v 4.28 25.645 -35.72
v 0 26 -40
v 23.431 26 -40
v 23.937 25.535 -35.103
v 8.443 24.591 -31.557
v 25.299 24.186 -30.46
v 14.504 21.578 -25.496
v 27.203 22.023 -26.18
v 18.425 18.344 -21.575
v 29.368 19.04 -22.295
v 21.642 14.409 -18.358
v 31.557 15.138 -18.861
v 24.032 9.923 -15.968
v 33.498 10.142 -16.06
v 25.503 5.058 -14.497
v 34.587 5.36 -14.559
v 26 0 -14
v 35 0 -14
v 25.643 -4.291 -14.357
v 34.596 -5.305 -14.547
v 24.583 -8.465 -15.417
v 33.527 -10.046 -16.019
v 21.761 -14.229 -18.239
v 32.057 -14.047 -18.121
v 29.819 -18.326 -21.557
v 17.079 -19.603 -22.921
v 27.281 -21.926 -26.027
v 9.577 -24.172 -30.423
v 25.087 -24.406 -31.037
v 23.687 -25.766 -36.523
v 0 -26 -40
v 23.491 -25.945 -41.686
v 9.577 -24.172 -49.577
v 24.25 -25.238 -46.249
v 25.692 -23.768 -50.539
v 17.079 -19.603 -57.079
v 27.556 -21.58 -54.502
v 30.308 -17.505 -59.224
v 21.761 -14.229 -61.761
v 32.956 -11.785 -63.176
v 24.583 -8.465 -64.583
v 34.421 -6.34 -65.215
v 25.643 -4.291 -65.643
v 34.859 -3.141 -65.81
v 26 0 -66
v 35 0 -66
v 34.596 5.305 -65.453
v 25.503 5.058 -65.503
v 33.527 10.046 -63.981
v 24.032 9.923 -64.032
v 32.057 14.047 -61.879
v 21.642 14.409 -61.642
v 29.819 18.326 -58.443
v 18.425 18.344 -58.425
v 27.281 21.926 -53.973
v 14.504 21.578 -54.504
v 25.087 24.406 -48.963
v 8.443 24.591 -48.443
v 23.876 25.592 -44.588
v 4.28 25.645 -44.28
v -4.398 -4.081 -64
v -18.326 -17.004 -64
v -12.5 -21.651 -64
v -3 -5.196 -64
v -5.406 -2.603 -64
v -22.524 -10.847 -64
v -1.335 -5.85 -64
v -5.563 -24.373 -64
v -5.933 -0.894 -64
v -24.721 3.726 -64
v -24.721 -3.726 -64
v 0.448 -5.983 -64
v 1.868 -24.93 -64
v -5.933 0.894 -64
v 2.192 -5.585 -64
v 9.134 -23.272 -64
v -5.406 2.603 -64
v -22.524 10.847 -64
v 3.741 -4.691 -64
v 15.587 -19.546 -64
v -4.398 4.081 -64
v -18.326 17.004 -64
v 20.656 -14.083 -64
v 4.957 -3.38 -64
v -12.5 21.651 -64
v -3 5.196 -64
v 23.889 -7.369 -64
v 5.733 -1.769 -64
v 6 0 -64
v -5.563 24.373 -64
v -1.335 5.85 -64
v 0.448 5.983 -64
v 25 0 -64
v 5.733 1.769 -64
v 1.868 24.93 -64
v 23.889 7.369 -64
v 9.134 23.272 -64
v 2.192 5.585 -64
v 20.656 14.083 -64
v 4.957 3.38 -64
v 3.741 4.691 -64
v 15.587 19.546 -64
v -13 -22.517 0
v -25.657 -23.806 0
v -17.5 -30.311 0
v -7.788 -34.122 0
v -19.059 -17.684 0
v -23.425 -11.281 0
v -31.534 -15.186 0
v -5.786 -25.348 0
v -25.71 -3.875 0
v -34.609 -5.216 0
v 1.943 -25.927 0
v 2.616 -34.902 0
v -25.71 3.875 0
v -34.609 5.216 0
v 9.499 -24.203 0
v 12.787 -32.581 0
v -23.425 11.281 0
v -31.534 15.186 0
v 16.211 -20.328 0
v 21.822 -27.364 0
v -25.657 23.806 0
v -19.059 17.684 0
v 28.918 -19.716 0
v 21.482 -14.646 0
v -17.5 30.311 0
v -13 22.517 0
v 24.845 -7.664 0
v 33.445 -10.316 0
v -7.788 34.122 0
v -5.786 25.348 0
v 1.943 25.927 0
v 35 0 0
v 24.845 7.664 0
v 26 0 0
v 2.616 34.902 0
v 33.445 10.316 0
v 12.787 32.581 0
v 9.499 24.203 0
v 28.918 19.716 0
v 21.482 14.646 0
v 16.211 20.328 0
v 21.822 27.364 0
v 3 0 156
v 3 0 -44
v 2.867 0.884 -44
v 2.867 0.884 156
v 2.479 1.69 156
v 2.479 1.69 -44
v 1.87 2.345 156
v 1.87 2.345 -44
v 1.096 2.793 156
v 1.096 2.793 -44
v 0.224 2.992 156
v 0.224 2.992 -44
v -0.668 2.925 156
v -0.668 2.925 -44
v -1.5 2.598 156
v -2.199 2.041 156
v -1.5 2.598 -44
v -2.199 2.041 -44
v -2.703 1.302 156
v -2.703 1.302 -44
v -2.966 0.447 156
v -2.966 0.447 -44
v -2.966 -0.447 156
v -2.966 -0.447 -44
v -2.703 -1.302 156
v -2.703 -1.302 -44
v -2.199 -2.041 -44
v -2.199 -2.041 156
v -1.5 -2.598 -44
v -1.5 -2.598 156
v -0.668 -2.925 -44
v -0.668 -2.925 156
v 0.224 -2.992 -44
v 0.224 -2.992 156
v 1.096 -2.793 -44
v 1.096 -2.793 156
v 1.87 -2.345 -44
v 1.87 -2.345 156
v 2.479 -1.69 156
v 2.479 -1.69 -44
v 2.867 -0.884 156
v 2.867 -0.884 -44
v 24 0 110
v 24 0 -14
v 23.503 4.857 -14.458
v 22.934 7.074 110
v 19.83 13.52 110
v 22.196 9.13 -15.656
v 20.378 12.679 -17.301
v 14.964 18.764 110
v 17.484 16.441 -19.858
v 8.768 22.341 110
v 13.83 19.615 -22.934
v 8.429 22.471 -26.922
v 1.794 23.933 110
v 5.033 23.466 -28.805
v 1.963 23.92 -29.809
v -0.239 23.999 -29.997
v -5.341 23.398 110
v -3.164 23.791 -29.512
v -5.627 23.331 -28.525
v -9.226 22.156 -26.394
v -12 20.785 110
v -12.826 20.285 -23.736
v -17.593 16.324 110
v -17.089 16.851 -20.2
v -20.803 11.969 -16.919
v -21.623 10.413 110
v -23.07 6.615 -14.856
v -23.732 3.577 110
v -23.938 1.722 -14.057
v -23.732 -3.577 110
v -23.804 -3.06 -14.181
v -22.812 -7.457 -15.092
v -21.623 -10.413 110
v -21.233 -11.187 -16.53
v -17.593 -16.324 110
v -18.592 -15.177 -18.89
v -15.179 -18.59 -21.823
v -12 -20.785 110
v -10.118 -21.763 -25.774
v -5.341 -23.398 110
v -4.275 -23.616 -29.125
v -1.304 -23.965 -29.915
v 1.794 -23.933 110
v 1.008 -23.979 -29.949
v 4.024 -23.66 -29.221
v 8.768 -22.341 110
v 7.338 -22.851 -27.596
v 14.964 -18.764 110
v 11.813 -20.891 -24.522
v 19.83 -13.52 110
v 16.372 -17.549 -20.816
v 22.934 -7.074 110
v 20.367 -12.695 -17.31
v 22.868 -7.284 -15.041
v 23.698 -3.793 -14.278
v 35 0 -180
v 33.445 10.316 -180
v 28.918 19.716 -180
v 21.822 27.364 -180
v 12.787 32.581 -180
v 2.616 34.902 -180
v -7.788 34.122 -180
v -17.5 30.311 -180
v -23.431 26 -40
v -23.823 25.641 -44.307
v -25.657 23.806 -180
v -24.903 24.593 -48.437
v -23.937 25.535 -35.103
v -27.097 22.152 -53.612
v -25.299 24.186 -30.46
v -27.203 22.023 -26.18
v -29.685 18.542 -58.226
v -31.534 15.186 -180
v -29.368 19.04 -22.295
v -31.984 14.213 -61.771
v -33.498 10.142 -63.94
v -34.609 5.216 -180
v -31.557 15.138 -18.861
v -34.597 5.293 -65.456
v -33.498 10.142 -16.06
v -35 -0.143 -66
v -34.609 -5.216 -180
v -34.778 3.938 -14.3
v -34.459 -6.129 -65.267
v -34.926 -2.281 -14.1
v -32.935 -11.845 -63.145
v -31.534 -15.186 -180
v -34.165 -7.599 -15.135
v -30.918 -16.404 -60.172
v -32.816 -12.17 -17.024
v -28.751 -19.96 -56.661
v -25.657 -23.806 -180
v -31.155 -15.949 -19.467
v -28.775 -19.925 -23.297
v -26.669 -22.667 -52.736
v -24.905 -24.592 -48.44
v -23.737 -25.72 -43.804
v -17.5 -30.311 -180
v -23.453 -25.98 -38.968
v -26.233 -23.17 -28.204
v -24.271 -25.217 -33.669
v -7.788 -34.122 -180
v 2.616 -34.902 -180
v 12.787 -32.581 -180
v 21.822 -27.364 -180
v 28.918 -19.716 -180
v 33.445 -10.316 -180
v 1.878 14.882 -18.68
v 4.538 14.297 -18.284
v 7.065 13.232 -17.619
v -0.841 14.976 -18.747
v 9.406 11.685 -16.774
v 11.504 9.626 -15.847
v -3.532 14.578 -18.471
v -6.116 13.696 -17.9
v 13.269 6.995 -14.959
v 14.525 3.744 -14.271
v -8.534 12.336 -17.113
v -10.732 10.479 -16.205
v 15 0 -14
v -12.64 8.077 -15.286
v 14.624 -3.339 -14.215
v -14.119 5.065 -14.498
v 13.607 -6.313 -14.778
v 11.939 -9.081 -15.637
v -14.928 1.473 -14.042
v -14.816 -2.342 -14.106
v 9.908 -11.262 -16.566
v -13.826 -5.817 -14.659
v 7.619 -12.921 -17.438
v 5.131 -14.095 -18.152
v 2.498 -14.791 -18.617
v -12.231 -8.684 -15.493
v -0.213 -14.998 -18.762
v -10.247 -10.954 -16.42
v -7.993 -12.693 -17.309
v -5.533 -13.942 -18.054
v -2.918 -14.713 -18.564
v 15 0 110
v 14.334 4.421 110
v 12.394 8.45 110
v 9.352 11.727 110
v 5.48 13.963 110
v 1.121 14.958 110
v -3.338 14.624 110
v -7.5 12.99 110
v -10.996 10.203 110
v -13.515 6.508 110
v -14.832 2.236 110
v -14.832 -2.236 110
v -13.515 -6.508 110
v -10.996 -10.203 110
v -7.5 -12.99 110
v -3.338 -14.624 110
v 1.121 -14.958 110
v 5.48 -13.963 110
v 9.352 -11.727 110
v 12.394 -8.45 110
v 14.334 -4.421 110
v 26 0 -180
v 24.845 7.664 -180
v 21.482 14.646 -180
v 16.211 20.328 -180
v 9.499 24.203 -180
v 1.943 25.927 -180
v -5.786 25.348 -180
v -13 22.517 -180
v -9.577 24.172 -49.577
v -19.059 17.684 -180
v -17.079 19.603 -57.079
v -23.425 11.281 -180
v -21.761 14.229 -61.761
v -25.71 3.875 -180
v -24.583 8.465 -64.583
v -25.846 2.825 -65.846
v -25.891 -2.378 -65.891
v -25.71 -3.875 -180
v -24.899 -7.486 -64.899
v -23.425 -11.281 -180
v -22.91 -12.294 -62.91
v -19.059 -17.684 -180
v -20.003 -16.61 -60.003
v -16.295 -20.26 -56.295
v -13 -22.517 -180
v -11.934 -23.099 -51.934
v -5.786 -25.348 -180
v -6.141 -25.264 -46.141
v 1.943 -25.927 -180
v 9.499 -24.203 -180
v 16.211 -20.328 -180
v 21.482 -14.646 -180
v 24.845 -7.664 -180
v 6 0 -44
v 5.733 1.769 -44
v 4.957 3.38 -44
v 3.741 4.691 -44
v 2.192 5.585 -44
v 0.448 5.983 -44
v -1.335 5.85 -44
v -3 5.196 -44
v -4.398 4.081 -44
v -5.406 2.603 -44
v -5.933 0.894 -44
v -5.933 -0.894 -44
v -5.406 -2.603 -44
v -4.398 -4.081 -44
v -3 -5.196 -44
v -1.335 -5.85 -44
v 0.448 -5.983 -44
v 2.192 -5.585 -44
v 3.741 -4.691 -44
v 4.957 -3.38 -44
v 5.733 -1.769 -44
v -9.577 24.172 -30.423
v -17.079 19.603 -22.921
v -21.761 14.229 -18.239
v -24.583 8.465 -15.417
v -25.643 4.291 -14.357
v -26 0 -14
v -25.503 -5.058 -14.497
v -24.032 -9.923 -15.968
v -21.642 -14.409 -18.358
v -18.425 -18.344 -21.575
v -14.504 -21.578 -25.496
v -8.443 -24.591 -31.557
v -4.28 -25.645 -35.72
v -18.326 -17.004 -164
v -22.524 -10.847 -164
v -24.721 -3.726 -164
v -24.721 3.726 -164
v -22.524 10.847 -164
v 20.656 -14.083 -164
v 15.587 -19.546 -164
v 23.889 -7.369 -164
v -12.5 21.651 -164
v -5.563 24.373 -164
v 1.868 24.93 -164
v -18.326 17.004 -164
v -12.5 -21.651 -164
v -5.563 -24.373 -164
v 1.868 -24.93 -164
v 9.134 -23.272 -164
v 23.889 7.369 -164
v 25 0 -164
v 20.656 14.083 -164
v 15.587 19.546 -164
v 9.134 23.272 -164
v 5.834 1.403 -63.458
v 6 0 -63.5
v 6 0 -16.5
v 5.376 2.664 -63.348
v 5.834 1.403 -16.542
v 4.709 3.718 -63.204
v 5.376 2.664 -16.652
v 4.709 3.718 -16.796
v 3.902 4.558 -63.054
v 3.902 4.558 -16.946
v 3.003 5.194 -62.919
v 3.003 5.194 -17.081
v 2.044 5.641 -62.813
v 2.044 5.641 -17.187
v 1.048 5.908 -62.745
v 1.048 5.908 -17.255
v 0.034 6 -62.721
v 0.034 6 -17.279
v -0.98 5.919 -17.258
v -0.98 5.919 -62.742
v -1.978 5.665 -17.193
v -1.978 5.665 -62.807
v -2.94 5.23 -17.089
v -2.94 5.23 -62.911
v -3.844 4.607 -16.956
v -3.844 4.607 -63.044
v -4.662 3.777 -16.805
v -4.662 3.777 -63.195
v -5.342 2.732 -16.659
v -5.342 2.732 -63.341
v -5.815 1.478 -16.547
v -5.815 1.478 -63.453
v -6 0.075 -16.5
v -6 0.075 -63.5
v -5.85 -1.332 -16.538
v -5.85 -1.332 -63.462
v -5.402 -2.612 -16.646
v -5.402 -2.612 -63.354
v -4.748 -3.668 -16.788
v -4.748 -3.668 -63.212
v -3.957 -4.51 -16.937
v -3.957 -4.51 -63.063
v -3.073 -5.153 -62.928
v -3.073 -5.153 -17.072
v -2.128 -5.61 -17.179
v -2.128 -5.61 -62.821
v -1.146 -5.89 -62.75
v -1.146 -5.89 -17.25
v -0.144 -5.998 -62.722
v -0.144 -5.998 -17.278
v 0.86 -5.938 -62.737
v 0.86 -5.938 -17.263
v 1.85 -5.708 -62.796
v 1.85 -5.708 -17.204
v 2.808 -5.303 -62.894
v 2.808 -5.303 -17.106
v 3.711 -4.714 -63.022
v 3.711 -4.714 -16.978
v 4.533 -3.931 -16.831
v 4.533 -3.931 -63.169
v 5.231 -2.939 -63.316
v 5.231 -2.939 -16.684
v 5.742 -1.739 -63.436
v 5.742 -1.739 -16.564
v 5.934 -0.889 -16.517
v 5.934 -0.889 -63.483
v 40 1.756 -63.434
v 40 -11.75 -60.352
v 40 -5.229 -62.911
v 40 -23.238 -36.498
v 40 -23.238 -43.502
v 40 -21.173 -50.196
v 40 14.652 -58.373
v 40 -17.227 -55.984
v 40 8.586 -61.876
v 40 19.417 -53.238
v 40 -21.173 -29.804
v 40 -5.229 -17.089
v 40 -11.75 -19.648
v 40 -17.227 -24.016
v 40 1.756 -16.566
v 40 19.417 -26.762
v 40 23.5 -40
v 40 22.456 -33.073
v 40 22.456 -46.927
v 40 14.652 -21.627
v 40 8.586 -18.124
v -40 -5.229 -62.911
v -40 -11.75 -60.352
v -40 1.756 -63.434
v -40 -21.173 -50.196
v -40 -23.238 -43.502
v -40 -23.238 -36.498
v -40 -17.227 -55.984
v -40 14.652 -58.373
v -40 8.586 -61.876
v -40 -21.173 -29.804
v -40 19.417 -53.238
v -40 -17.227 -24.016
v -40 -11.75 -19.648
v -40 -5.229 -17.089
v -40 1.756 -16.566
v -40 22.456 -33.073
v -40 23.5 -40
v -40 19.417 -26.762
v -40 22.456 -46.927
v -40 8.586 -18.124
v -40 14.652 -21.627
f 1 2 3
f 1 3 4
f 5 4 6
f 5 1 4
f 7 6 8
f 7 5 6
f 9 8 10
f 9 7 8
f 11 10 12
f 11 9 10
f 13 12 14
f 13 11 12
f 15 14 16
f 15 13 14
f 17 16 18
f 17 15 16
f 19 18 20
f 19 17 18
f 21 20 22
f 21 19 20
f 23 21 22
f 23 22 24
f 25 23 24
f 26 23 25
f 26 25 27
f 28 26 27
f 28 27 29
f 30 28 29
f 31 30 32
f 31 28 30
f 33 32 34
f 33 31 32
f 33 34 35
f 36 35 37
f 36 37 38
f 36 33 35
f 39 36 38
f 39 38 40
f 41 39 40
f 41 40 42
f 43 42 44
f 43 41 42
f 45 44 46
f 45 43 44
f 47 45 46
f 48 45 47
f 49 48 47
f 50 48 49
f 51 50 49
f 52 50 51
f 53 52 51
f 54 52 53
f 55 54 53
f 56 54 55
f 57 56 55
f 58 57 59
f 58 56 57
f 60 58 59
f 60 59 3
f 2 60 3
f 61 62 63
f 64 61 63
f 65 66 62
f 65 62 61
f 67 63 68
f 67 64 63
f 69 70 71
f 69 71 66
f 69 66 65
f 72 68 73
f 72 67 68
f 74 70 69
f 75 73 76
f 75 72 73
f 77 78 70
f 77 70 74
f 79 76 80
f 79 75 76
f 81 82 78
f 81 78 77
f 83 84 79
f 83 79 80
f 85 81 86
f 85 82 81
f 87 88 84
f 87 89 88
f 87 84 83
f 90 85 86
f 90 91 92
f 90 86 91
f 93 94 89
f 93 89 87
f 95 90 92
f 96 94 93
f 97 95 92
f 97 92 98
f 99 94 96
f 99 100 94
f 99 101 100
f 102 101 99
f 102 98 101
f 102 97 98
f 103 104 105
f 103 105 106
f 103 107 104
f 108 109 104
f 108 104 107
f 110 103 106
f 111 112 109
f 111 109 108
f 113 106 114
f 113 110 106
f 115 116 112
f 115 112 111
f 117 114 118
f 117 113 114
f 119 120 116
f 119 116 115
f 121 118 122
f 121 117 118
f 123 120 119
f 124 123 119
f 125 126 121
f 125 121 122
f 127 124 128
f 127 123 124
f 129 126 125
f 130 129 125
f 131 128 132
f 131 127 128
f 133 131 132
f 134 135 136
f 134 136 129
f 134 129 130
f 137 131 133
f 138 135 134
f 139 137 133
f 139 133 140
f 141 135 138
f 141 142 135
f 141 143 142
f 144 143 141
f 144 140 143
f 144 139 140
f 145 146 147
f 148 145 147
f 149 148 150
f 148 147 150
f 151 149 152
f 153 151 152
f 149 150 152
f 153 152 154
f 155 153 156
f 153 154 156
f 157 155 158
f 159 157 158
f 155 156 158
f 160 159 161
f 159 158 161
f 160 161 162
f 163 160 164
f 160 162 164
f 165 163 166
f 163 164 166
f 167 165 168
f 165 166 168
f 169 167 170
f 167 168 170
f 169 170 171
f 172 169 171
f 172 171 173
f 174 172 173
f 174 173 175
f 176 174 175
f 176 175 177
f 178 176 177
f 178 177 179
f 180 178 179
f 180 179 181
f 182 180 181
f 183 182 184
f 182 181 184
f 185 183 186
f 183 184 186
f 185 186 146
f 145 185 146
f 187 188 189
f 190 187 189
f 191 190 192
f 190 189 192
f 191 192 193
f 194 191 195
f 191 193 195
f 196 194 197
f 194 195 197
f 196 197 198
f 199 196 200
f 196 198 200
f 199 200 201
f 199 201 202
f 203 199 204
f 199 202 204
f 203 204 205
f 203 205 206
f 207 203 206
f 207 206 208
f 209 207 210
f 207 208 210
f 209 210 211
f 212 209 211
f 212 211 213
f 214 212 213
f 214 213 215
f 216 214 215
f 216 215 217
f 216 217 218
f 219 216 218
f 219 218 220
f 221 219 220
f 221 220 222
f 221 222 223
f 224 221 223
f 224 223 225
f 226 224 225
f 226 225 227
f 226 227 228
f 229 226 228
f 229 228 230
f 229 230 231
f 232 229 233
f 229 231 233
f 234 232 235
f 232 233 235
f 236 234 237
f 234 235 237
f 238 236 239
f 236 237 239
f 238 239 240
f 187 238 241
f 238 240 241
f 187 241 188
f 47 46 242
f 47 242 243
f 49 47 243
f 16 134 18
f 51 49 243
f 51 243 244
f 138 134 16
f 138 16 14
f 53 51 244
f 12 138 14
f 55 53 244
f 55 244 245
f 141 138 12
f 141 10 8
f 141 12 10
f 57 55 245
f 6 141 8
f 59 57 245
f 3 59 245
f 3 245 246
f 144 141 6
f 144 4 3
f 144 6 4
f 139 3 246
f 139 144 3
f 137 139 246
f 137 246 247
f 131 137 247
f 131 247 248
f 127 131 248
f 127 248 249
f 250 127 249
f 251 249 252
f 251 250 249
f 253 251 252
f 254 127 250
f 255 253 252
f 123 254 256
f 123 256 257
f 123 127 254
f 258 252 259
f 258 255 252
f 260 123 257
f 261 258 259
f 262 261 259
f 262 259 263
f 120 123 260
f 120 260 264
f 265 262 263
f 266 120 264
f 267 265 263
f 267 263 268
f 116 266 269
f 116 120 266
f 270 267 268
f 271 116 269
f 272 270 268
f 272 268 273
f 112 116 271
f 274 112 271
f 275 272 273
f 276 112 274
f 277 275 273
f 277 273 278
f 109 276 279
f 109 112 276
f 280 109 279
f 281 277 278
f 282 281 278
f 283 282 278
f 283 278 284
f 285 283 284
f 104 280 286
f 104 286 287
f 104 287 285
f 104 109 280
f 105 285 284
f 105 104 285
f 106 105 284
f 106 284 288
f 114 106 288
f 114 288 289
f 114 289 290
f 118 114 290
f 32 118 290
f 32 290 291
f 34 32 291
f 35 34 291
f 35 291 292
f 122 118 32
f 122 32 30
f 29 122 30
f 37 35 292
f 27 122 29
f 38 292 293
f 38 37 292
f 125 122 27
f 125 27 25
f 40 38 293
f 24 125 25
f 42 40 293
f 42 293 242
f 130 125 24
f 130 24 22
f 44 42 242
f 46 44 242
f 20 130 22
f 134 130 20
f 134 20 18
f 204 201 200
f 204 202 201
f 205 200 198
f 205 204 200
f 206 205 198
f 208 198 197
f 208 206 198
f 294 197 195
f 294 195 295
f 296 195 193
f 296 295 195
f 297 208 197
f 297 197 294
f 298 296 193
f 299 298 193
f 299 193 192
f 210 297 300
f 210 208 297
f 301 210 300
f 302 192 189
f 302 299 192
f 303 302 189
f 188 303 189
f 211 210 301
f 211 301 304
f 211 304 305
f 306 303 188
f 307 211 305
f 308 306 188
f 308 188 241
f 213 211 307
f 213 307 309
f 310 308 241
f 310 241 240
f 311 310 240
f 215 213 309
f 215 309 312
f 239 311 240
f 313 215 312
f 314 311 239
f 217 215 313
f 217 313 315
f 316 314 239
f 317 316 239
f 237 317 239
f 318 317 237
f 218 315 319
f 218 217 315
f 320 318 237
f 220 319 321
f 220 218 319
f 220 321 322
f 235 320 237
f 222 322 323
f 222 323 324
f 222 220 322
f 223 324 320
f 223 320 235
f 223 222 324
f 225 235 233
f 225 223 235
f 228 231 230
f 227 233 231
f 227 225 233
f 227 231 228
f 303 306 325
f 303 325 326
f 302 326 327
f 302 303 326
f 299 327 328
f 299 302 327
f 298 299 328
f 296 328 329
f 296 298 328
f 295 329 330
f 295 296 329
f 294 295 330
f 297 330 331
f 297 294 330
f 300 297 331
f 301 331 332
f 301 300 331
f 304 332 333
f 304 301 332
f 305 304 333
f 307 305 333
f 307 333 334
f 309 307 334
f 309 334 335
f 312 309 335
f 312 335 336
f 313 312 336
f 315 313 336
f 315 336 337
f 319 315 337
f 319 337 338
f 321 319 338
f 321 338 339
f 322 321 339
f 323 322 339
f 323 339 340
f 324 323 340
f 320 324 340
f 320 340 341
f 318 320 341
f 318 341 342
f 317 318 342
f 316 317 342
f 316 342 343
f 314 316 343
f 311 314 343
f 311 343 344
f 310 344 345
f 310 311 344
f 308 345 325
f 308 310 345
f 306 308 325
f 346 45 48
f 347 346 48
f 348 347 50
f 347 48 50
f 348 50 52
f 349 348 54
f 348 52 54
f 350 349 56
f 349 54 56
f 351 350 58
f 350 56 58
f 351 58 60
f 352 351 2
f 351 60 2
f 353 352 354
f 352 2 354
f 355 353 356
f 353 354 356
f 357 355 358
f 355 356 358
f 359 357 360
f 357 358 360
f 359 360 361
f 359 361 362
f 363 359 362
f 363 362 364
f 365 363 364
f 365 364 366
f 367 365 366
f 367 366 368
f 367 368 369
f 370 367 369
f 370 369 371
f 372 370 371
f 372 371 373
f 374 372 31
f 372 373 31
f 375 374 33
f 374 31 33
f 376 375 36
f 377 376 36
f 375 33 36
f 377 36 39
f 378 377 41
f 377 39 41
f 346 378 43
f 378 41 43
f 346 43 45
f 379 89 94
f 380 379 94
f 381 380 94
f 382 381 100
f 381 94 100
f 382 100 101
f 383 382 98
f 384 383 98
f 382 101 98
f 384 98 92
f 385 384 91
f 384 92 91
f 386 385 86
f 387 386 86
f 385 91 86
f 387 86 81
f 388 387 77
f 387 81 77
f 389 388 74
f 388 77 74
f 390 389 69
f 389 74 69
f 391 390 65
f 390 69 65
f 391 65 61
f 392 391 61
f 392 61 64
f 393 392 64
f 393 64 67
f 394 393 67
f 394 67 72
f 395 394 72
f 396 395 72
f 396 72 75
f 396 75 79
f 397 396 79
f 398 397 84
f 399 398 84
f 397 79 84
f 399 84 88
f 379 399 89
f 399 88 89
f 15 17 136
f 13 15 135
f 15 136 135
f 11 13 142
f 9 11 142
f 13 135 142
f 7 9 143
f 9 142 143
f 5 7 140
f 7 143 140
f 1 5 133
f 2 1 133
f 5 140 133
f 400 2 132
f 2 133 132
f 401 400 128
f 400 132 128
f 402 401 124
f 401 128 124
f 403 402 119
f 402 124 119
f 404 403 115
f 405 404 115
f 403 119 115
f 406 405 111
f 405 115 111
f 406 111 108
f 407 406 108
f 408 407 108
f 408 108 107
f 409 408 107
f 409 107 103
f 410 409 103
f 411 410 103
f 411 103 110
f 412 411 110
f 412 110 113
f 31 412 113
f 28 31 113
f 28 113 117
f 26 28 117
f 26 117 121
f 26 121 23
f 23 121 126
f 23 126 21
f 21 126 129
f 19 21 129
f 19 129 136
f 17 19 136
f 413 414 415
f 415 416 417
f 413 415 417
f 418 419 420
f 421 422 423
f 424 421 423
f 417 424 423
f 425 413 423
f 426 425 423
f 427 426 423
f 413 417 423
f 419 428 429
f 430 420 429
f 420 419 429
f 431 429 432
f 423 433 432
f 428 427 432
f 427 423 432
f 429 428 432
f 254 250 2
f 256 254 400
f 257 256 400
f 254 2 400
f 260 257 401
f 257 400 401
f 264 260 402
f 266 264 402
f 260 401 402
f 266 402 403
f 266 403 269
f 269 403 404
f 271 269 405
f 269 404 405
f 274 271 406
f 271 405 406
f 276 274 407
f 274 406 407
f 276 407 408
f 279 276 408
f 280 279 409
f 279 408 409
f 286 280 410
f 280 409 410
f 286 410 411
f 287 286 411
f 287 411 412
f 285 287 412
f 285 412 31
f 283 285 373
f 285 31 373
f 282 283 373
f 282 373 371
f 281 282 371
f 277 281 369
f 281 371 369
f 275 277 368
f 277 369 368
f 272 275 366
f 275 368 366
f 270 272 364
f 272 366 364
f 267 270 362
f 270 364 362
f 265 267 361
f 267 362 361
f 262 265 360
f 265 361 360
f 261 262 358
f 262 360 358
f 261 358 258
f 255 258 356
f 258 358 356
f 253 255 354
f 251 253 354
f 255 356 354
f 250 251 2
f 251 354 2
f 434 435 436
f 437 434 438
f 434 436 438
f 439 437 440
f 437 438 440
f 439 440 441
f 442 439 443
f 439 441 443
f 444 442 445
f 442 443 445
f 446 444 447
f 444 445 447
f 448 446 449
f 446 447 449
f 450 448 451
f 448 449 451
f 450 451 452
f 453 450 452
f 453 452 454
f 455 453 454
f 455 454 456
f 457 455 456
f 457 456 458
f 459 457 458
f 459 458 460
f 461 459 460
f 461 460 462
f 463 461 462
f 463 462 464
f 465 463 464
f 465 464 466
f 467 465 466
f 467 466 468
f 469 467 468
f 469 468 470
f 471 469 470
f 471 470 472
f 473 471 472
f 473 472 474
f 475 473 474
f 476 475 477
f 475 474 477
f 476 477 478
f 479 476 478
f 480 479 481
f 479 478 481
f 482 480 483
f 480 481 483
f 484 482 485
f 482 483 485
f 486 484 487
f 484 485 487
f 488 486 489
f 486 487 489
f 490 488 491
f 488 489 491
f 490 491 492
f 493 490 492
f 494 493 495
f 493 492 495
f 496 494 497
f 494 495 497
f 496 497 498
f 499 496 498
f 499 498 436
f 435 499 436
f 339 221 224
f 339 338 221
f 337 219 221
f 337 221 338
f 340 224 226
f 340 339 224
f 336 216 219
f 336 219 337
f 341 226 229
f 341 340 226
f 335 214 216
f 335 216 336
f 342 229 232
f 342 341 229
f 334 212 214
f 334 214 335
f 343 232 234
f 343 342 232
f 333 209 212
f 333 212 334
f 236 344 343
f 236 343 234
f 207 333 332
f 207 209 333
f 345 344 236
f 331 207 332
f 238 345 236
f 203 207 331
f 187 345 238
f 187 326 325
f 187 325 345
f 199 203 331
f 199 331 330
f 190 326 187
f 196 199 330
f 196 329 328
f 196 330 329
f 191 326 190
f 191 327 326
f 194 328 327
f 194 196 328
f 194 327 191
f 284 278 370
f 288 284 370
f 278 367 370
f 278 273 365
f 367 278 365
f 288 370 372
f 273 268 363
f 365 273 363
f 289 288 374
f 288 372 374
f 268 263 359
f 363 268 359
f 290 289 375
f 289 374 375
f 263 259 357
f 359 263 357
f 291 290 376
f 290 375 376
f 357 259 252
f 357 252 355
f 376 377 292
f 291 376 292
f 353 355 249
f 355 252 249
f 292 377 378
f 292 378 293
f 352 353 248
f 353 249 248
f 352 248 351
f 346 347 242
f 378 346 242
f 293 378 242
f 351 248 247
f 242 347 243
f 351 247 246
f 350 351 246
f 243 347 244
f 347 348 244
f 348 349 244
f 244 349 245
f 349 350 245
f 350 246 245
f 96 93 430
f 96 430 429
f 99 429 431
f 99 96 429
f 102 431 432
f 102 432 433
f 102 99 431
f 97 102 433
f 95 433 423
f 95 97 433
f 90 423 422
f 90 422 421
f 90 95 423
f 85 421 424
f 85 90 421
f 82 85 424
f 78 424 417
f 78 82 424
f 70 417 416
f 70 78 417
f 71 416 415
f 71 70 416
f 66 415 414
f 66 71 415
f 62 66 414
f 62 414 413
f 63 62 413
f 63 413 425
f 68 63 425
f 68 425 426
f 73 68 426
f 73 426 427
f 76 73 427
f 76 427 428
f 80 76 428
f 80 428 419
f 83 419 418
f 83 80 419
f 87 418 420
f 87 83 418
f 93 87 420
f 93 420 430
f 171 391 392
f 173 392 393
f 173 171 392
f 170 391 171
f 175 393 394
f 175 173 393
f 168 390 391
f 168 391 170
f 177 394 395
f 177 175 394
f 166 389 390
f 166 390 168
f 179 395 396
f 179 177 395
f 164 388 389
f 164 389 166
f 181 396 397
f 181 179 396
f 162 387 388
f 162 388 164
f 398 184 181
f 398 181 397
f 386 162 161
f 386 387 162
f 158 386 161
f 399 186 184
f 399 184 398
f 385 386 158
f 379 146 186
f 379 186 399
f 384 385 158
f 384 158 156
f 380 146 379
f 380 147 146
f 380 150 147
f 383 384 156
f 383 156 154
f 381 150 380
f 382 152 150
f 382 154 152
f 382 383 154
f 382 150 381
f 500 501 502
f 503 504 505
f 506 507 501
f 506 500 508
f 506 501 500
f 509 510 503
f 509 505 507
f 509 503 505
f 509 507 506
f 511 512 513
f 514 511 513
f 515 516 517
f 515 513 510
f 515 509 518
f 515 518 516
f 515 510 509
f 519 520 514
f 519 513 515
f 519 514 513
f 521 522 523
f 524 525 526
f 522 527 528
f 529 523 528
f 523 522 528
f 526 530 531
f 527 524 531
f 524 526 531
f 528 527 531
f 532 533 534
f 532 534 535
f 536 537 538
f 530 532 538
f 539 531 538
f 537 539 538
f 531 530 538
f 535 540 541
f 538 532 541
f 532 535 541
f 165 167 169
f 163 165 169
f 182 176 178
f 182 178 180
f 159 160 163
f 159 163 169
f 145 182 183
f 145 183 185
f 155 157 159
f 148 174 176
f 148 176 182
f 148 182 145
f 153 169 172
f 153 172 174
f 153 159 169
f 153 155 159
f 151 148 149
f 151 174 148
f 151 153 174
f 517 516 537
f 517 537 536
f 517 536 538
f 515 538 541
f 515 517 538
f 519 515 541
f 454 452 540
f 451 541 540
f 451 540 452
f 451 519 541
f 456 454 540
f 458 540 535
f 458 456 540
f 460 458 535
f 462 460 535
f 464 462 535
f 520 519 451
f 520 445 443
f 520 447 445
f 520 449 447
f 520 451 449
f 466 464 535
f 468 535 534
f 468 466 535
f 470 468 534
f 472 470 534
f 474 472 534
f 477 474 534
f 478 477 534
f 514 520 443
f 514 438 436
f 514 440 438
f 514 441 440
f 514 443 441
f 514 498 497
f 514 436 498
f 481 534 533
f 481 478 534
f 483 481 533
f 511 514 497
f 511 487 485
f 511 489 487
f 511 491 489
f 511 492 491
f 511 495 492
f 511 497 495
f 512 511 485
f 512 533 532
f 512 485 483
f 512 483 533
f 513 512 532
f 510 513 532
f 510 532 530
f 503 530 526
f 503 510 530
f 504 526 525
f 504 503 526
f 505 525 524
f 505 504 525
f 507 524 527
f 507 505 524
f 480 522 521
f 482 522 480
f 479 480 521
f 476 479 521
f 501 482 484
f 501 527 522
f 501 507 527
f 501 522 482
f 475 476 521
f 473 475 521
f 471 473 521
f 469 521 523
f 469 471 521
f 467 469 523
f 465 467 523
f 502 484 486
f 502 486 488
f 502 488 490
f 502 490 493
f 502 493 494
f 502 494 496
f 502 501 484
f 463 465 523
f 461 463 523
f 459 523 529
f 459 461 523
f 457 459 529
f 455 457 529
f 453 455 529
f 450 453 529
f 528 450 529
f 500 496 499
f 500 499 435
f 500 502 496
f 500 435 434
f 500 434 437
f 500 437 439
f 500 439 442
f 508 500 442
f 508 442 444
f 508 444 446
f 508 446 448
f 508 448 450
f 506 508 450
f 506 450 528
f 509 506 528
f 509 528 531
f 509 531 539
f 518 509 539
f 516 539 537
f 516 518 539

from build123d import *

# Parameters (mm, degrees)
F0_R           = 35
F0_R_2         = 26
F1_DEPTH       = 180
F3_R           = 24
F3_R_2         = 15
F4_DEPTH       = 150
F5_R           = 26
F6_DEPTH       = 35.001
F6_DEPTH_BACK  = 35.001
F7_R           = 23.5
F8_DEPTH       = 40
F8_DEPTH_BACK  = 40
F9_R           = 6
F10_DEPTH      = 110.0010001
F10_DEPTH_BACK = 180.0010001
F12_R          = 25
F13_DEPTH      = 100
F14_R          = 6
F15_DEPTH      = 20
F16_R          = 3
F17_DEPTH      = 200


with BuildPart() as f1:
    # F0 (on Top) → F1 (new body)
    with BuildSketch(Plane.XY):
        Circle(F0_R)
        Circle(F0_R_2, mode=Mode.SUBTRACT)
    extrude(amount=-F1_DEPTH)


with BuildPart() as f4:
    # F3 (on offset) → F4 (new body)
    with BuildSketch(Plane.XY.offset(-40)):
        Circle(F3_R)
        Circle(F3_R_2, mode=Mode.SUBTRACT)
    extrude(amount=F4_DEPTH)


with BuildPart() as f6_tool:
    # F5 (on Right) → F6 (new body, two sides)
    with BuildSketch(Plane.YZ) as f6_sk:
        with Locations((0, -40)):
            Circle(F5_R)
    extrude(amount=-F6_DEPTH)
    extrude(f6_sk.sketch, amount=F6_DEPTH_BACK)


with BuildPart() as f1_1:
    add(f1.part)

    # F6: cut by f6_tool
    add(f6_tool.part, mode=Mode.SUBTRACT)


with BuildPart() as f4_1:
    add(f4.part)

    # F6: cut by f6_tool
    add(f6_tool.part, mode=Mode.SUBTRACT)


with BuildPart() as f8:
    # F7 (on Right) → F8 (new body, two sides)
    with BuildSketch(Plane.YZ) as f8_sk:
        with Locations((0, -40)):
            Circle(F7_R)
    extrude(amount=F8_DEPTH)
    extrude(f8_sk.sketch, amount=-F8_DEPTH_BACK)

    # F9 (on Top) → F10 (cut, two sides)
    with BuildSketch(Plane.XY) as f10_sk:
        Circle(F9_R)
    extrude(amount=F10_DEPTH, mode=Mode.SUBTRACT)
    extrude(f10_sk.sketch, amount=-F10_DEPTH_BACK, mode=Mode.SUBTRACT)


with BuildPart() as f13:
    # F12 (on offset) → F13 (new body)
    with BuildSketch(Plane.XY.offset(-64)):
        Circle(F12_R)
    extrude(amount=-F13_DEPTH)

    # F14 (on face) → F15 (join)
    with BuildSketch(Plane.XY.offset(-64)):
        Circle(F14_R)
    extrude(amount=F15_DEPTH)

    # F16 (on face) → F17 (join)
    with BuildSketch(Plane.XY.offset(-44)):
        Circle(F16_R)
    extrude(amount=F17_DEPTH)


solid = Compound([f1_1.part, f4_1.part, f8.part, f13.part])
